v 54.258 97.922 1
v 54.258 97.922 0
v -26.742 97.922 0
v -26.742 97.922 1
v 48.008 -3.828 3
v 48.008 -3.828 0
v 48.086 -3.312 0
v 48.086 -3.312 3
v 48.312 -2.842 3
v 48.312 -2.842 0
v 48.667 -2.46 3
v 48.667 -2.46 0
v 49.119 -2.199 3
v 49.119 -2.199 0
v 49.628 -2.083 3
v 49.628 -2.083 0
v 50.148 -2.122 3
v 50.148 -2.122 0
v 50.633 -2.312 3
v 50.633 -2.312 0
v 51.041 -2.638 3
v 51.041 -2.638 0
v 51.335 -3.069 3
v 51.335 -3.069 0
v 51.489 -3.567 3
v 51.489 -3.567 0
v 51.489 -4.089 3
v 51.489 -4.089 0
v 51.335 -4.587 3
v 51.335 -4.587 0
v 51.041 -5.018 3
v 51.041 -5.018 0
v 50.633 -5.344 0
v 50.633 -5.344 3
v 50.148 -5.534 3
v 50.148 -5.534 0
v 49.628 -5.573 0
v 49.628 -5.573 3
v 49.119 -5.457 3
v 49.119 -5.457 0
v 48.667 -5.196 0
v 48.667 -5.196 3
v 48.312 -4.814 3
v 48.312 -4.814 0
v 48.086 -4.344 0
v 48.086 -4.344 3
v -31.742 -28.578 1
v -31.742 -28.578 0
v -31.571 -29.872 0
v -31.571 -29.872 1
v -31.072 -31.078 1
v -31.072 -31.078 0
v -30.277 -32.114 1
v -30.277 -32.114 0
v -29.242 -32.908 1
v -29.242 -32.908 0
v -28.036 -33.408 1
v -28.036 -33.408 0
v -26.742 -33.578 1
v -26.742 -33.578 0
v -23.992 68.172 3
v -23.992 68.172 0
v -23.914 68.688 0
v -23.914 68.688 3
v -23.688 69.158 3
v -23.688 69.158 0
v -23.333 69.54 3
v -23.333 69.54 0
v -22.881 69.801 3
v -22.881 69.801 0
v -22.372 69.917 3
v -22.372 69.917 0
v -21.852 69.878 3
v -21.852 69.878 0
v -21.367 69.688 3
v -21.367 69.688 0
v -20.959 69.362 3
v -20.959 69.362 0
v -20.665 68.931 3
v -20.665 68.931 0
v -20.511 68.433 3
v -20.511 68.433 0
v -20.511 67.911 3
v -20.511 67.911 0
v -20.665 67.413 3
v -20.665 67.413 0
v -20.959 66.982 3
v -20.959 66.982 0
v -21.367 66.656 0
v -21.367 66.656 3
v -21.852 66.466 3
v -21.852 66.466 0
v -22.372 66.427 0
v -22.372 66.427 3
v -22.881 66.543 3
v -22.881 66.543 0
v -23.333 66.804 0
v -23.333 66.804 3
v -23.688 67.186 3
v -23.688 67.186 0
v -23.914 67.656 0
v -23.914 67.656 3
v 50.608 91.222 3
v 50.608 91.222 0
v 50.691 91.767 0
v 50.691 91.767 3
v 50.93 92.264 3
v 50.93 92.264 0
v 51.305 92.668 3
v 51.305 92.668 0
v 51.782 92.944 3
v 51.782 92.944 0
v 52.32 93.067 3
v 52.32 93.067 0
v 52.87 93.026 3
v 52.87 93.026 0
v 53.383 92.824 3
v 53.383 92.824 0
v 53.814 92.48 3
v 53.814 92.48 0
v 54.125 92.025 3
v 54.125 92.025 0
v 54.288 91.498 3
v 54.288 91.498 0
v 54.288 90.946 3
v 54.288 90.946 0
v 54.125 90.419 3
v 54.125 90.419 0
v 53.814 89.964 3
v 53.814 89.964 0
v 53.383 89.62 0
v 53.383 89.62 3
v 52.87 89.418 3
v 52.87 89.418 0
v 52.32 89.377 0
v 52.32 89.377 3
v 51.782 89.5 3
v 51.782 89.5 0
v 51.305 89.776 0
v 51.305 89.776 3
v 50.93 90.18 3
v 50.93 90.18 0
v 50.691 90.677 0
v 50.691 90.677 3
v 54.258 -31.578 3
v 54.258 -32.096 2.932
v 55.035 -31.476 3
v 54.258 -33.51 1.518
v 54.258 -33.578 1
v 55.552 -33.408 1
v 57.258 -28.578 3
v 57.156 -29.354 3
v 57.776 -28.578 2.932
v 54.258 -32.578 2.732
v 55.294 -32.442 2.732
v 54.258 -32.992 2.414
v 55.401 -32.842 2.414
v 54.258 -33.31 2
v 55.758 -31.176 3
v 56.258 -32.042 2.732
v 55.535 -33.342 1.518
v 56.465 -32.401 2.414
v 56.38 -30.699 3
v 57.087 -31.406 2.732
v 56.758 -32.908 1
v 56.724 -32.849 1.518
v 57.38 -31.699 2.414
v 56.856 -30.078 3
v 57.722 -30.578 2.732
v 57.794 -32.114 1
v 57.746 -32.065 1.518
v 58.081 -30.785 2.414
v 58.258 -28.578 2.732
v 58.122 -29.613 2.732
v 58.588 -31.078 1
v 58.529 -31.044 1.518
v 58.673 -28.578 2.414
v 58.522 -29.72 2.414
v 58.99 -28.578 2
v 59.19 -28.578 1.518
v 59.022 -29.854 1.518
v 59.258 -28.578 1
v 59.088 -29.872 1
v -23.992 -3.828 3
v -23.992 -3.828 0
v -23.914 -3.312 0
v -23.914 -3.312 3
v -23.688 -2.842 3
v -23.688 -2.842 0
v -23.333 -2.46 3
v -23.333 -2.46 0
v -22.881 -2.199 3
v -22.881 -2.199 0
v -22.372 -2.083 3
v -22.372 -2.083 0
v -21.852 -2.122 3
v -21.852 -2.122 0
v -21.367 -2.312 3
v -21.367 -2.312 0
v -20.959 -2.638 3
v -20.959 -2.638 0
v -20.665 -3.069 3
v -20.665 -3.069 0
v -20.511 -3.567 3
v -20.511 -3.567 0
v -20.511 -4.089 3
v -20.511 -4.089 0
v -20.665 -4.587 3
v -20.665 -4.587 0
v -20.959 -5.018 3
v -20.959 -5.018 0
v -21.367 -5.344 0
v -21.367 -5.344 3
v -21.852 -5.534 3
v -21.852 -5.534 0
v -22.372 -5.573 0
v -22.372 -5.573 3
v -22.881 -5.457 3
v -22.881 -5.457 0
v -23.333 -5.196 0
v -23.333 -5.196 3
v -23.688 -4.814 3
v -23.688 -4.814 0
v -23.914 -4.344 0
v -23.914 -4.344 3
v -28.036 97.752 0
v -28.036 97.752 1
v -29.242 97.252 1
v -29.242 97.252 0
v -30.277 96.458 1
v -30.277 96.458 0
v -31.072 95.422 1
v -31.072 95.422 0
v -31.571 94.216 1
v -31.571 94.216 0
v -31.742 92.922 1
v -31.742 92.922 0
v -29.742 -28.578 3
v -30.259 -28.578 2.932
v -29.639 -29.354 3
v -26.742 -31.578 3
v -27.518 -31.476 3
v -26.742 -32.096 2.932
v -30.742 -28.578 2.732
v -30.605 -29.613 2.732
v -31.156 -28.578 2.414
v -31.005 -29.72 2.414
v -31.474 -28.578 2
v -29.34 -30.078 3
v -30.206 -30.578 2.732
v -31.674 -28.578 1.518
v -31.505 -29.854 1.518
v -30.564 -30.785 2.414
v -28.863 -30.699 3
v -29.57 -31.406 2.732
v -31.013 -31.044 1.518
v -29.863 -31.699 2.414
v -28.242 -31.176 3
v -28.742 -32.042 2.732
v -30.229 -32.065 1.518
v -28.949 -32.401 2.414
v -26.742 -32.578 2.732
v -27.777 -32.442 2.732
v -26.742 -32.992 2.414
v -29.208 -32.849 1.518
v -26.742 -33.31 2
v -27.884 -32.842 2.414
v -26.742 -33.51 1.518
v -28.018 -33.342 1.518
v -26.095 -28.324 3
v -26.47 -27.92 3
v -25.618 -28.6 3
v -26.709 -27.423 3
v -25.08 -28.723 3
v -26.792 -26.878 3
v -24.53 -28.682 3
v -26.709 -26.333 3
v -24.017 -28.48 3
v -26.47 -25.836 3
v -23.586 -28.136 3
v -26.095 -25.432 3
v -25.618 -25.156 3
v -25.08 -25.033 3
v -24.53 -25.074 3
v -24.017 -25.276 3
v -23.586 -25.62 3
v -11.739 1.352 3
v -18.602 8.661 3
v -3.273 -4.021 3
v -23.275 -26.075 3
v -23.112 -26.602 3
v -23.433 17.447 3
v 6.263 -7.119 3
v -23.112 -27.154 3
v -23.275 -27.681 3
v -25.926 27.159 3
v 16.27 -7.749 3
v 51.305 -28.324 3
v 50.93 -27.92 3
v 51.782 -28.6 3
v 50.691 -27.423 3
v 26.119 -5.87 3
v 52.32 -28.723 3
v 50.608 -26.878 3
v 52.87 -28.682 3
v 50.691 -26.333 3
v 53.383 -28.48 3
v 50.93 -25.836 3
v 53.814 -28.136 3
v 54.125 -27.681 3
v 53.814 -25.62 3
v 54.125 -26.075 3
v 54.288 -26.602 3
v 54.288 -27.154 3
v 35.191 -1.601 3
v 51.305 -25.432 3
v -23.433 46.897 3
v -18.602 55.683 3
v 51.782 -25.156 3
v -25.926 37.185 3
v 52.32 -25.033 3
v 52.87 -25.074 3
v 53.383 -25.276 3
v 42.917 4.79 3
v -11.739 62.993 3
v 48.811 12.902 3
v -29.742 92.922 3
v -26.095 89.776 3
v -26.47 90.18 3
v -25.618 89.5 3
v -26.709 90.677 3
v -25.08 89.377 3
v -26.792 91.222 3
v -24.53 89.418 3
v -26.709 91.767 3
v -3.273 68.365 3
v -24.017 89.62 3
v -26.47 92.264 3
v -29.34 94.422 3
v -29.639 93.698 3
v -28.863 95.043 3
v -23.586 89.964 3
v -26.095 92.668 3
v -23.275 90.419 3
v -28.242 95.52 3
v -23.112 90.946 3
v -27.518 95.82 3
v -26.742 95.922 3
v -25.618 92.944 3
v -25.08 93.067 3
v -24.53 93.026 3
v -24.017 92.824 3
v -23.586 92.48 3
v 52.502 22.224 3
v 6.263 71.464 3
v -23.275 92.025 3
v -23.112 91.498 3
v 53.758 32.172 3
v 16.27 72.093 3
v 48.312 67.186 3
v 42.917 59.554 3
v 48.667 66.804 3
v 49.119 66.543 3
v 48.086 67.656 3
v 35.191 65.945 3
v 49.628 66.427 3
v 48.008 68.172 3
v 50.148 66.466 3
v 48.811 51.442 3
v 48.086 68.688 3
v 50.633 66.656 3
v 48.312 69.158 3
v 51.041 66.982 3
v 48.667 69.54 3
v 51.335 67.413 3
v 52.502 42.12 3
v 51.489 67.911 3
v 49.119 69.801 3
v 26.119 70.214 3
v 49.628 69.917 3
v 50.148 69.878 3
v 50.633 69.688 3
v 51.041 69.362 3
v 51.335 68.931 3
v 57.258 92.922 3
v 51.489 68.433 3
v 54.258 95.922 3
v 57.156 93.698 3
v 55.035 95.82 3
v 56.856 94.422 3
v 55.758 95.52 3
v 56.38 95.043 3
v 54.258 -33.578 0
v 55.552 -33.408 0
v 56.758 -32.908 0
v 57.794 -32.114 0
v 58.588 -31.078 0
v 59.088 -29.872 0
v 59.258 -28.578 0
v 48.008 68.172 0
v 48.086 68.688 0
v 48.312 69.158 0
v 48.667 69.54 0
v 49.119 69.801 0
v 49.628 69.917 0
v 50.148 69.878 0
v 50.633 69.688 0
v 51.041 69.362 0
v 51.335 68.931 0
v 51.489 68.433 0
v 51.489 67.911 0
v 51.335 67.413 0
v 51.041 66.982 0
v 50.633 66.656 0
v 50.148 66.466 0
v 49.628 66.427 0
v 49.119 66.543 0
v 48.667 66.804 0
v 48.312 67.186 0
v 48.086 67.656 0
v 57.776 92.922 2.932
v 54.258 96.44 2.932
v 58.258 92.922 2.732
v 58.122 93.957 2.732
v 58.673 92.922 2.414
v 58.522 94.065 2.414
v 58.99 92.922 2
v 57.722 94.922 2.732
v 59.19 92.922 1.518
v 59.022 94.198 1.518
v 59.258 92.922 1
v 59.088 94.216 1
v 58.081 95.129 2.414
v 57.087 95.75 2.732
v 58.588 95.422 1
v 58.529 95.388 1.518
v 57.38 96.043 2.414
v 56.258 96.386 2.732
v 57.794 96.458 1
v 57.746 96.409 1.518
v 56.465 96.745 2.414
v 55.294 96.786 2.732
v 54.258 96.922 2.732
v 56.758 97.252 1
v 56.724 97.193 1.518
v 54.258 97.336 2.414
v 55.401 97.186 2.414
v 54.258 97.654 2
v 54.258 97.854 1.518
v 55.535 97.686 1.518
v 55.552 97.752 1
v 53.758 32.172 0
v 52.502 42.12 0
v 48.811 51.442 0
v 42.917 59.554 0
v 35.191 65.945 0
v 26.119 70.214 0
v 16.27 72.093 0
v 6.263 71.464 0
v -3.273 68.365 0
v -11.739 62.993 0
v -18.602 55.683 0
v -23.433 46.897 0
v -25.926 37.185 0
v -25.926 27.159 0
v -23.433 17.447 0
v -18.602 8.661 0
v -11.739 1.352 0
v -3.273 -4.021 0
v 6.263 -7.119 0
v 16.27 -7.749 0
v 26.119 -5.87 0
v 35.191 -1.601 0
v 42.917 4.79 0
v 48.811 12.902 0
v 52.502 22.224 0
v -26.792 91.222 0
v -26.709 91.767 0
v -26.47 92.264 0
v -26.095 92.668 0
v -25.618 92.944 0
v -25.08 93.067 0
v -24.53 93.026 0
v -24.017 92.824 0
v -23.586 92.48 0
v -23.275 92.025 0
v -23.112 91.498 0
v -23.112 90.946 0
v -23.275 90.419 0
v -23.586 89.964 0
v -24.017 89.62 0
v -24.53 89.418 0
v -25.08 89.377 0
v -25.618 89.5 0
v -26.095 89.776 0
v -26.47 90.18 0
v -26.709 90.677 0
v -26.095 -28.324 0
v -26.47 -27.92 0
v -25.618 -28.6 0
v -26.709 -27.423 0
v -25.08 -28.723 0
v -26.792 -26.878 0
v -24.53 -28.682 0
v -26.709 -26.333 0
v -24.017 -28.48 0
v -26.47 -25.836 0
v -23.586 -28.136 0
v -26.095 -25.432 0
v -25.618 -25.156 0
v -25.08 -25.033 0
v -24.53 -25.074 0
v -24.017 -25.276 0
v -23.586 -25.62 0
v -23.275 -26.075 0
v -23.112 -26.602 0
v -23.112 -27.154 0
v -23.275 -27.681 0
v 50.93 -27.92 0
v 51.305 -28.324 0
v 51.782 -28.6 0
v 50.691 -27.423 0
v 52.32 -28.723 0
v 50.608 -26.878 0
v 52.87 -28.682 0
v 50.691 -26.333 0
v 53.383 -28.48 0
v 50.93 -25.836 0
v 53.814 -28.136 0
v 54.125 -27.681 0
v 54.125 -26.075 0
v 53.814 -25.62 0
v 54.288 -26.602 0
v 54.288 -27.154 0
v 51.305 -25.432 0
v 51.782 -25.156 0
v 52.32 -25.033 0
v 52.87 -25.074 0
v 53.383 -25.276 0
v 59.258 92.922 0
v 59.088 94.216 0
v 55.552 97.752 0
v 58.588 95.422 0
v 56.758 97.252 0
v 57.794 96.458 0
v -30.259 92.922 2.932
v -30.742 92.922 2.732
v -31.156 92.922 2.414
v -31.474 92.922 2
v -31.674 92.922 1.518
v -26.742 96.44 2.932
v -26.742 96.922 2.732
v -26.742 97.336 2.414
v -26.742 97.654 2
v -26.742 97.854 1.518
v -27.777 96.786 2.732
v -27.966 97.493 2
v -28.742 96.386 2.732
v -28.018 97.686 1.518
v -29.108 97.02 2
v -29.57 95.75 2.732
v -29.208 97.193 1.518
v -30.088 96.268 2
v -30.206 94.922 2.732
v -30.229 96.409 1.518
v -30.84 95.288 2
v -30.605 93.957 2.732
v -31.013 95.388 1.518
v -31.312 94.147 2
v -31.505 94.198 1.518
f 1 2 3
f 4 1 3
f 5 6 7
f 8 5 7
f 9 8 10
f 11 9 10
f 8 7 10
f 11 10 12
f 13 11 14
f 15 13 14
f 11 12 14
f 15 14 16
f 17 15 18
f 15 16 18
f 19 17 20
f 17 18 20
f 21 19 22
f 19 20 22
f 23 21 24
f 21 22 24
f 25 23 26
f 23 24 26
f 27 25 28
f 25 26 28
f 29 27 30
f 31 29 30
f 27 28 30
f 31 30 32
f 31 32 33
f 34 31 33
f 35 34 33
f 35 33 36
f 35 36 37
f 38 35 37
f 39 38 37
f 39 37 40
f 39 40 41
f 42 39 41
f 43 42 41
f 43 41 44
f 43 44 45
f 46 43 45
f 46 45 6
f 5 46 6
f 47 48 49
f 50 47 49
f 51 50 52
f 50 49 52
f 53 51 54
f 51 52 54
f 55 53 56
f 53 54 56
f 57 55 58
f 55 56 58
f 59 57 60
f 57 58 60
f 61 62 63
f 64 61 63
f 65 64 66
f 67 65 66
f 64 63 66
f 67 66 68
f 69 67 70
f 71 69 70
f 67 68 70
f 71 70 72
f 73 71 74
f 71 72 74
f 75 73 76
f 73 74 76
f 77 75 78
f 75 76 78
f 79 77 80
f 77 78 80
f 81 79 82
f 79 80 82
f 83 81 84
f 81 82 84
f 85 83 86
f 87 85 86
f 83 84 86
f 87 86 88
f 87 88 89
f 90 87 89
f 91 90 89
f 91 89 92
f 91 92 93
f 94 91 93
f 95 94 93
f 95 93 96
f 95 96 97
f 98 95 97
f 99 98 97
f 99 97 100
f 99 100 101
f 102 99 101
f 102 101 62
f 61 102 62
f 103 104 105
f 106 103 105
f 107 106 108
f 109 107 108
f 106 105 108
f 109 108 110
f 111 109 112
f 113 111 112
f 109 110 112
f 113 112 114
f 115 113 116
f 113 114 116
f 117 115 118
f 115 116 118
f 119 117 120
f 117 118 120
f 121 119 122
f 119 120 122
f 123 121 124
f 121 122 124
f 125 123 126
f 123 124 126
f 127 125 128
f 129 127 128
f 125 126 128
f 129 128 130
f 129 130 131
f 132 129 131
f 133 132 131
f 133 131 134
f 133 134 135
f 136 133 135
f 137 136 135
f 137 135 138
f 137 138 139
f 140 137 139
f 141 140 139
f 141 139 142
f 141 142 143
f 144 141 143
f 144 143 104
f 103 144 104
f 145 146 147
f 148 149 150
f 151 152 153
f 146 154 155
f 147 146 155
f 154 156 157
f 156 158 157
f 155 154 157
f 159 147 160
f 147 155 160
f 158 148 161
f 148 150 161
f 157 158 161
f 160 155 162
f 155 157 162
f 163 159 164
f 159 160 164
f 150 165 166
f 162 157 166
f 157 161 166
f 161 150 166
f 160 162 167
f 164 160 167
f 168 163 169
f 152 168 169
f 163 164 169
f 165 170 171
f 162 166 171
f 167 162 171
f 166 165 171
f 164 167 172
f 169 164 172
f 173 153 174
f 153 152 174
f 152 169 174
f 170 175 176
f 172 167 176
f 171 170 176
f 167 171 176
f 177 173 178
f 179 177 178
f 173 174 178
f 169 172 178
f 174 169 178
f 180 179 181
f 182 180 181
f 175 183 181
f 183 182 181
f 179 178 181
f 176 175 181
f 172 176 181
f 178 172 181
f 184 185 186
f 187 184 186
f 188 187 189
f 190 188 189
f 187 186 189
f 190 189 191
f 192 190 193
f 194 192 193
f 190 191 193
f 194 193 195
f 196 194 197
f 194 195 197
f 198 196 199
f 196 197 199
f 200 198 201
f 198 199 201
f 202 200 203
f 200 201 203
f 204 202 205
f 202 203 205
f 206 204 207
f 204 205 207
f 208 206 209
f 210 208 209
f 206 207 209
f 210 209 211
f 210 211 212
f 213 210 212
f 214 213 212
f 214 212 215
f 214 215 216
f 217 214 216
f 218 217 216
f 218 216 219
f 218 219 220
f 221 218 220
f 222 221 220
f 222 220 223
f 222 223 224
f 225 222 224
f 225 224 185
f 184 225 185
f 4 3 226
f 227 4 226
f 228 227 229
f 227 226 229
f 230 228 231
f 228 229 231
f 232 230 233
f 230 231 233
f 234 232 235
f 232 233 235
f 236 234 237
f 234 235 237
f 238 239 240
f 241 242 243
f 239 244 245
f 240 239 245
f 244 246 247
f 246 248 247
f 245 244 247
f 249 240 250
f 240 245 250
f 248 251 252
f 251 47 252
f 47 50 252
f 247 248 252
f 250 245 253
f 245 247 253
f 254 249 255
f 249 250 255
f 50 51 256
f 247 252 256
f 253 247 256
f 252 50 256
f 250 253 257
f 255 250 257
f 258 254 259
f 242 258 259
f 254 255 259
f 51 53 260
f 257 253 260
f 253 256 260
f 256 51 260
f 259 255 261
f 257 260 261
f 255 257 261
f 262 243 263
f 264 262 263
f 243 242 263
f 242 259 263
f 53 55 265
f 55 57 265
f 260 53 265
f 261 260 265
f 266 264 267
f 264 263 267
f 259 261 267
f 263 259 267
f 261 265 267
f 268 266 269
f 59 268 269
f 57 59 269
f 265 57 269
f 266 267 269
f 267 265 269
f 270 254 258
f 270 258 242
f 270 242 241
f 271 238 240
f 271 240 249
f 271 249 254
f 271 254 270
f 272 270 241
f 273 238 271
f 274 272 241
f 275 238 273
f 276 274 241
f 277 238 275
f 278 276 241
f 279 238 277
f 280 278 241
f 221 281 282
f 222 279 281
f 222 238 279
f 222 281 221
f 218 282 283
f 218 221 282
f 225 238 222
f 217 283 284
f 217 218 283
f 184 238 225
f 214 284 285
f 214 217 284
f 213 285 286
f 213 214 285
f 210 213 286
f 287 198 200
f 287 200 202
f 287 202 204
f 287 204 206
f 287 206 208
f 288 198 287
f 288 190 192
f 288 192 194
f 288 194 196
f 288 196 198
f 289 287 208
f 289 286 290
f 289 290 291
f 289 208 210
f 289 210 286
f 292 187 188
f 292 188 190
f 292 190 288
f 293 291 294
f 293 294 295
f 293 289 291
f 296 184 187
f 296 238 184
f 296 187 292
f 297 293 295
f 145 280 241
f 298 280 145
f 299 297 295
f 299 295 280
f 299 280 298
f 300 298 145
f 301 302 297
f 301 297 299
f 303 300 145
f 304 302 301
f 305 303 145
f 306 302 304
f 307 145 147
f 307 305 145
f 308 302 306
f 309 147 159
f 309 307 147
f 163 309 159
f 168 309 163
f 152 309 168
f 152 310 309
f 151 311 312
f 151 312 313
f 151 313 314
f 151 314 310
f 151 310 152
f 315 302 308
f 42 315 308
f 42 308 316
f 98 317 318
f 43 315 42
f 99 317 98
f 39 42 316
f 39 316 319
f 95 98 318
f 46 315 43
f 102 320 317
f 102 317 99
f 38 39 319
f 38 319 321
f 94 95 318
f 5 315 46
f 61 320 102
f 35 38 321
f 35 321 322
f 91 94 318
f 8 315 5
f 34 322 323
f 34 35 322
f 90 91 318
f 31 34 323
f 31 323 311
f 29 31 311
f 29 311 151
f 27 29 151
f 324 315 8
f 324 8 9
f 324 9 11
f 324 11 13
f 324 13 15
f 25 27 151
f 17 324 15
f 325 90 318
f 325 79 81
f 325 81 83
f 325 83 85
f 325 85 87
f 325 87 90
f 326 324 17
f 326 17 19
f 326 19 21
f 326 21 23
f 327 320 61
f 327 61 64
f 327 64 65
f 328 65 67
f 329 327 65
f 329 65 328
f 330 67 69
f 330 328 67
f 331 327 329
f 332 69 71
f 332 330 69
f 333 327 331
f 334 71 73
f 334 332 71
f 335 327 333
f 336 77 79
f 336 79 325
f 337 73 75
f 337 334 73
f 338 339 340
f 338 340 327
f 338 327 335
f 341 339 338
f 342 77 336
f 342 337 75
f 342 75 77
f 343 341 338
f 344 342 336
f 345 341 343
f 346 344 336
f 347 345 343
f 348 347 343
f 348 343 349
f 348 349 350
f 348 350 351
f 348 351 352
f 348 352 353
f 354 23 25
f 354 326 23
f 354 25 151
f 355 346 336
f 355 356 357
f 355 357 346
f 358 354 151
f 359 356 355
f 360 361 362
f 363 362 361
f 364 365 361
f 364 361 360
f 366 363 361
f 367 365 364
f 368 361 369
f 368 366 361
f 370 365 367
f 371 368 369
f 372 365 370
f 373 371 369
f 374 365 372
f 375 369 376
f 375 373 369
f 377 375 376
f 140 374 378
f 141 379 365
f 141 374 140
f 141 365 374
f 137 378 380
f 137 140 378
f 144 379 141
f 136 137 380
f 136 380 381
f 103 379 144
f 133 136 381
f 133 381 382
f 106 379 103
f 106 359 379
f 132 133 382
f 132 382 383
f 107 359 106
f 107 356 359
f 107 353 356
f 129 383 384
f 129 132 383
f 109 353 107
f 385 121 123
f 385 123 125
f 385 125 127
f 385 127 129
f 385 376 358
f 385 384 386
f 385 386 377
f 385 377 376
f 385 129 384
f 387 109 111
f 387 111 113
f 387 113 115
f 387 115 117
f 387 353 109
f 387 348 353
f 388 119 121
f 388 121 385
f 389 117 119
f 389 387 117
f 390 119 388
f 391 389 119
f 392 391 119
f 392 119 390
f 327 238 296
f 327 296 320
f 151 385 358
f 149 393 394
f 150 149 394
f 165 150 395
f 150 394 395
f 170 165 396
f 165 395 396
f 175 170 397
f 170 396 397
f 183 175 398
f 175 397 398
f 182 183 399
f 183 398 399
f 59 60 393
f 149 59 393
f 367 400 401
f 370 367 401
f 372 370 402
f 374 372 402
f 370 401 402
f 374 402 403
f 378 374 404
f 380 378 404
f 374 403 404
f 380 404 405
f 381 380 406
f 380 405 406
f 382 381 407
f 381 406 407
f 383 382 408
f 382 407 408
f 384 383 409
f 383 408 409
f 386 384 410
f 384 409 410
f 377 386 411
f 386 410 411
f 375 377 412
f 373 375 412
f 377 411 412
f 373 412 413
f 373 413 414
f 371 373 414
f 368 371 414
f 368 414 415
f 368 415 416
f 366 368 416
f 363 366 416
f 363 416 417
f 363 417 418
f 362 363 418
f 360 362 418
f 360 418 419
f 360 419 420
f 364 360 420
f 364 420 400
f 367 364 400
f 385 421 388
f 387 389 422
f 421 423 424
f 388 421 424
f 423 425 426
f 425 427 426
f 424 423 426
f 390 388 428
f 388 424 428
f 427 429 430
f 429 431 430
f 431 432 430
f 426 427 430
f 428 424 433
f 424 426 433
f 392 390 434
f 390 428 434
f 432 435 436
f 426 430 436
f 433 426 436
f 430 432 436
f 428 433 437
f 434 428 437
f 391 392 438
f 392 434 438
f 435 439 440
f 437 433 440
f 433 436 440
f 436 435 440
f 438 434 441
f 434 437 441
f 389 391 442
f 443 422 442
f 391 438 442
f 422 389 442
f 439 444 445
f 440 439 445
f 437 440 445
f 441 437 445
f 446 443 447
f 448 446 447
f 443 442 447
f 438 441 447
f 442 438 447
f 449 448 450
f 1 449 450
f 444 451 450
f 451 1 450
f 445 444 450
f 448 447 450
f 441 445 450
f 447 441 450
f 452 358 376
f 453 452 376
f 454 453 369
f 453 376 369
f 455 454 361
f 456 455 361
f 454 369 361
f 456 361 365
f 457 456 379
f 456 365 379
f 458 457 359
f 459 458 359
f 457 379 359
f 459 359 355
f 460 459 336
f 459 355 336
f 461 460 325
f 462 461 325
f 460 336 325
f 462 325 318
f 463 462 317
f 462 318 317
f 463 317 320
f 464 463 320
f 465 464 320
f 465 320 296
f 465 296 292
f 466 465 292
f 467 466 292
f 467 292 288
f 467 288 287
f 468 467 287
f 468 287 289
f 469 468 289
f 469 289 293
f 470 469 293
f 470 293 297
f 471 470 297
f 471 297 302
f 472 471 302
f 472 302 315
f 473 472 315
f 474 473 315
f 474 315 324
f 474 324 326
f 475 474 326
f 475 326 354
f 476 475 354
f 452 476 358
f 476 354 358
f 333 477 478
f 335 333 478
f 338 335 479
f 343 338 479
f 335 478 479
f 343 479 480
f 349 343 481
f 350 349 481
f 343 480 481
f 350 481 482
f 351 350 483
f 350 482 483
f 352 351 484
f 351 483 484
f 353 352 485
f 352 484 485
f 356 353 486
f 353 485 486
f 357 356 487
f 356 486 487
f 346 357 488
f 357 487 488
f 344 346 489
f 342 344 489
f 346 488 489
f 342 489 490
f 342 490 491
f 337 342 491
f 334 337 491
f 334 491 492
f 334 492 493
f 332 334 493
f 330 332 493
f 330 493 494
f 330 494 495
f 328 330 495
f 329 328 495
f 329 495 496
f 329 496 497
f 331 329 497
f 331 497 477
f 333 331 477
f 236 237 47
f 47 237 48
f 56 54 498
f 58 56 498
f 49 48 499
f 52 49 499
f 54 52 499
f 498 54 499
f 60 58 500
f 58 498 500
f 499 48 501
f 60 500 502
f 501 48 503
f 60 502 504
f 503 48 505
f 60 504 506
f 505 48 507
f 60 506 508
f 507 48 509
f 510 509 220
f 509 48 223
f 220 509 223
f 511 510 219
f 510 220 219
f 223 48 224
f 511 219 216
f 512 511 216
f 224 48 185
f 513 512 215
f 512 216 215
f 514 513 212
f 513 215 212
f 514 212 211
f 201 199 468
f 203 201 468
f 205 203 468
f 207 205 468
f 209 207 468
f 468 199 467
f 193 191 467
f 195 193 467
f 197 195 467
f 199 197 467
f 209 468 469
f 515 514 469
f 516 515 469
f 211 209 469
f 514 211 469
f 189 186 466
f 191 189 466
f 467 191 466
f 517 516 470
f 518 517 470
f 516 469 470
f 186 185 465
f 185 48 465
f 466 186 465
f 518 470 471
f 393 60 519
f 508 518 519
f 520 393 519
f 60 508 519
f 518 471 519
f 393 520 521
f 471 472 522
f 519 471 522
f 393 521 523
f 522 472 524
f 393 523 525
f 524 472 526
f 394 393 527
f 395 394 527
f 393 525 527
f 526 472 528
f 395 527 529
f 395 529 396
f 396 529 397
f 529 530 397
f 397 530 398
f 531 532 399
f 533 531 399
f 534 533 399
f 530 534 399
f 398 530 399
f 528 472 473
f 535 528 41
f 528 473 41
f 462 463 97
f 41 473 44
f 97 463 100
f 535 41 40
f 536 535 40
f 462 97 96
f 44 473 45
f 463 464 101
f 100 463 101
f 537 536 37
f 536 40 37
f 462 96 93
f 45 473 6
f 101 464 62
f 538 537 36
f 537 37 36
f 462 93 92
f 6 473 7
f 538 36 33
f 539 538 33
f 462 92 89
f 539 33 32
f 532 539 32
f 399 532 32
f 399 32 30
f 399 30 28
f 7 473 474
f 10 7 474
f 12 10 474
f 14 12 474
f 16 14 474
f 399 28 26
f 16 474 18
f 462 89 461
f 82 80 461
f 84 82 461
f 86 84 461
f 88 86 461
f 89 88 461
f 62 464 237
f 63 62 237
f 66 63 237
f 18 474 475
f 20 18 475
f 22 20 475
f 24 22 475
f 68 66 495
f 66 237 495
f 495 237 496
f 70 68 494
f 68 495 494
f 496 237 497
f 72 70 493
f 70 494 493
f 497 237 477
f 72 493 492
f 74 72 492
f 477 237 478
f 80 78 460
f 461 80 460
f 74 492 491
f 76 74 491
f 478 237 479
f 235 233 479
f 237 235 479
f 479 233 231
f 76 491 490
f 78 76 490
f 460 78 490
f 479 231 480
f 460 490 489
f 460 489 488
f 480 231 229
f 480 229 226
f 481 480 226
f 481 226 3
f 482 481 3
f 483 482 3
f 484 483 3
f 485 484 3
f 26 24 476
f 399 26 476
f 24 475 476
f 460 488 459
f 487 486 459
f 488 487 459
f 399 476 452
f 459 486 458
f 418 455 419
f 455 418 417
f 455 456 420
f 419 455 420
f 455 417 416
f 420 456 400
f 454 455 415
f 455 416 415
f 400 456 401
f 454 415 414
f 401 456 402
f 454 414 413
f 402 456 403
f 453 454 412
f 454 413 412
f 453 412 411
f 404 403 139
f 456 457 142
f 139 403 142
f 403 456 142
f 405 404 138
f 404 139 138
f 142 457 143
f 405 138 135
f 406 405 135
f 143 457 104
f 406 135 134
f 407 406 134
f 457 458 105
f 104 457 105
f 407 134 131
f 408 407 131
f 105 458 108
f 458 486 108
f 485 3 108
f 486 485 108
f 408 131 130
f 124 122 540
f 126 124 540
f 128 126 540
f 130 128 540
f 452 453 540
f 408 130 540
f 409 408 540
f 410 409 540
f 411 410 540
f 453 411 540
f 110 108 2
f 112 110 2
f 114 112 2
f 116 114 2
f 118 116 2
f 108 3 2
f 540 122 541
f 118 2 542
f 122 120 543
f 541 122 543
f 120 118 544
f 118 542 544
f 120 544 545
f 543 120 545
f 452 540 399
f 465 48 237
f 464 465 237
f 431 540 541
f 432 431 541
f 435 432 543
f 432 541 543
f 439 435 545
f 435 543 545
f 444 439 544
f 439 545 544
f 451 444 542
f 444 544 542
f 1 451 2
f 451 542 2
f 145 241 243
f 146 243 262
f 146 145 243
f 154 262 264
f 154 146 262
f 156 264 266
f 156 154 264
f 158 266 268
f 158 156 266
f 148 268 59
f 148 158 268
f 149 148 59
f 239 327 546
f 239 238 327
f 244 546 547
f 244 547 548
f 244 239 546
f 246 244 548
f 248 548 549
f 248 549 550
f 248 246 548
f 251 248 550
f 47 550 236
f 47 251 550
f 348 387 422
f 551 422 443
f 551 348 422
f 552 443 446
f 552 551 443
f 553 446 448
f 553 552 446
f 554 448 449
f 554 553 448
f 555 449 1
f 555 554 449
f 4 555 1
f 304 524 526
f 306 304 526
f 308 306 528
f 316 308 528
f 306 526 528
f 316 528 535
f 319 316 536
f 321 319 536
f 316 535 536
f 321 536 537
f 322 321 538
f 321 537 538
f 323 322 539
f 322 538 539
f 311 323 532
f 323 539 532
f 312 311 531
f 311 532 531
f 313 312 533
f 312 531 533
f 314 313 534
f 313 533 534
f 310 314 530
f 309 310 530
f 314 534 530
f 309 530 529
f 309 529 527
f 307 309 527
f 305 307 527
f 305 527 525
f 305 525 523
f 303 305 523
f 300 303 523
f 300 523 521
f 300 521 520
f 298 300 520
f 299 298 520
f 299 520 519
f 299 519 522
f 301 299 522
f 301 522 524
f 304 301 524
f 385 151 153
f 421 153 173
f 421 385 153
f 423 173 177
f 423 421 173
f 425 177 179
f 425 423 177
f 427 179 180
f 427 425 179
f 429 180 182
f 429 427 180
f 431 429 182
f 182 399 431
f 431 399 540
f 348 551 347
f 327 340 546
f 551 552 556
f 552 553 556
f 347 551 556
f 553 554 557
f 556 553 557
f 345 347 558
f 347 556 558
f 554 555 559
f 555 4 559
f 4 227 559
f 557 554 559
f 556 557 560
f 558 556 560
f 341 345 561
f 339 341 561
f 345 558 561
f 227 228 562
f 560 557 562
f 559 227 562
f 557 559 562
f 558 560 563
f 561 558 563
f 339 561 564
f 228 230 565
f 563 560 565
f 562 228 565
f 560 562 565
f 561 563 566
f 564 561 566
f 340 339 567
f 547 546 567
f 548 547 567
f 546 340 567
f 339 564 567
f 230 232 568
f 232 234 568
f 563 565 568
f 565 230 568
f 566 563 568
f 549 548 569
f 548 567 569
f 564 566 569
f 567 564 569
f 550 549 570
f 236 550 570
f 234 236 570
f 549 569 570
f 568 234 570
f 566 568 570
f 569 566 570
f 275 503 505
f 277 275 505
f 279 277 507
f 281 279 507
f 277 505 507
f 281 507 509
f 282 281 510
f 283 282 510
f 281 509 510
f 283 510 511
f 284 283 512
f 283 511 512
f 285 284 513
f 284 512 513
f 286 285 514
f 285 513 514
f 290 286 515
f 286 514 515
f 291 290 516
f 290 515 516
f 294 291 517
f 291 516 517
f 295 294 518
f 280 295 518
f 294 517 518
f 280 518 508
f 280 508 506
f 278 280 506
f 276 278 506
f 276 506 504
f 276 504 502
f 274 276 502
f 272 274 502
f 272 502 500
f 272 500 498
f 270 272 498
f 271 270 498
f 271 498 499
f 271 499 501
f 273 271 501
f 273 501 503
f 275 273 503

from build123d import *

# Parameters (mm, degrees)
F1_DEPTH = 3
F3_D     = 3.7
F5_R     = 40
F6_DEPTH = 25
F7_R     = 2
F8_D     = 3.5


with BuildPart() as f1:
    # F0 (on Top) → F1 (new body)
    with BuildSketch(Plane.XY):
        with BuildLine():
            Line((-26.741671, -33.577967), (54.258329, -33.577967))
            ThreePointArc((54.258329, -33.577967), (57.793863, -32.113501), (59.258329, -28.577967))
            Line((59.258329, -28.577967), (59.258329, 92.922033))
            ThreePointArc((59.258329, 92.922033), (57.793863, 96.457566), (54.258329, 97.922033))
            Line((54.258329, 97.922033), (-26.741671, 97.922033))
            ThreePointArc((-26.741671, 97.922033), (-30.277205, 96.457566), (-31.741671, 92.922033))
            Line((-31.741671, 92.922033), (-31.741671, -28.577967))
            ThreePointArc((-31.741671, -28.577967), (-30.277205, -32.113501), (-26.741671, -33.577967))
        make_face()
    extrude(amount=F1_DEPTH)

    # F3 (through all)
    with Locations(Plane.XY.offset(3)):
        with Locations((-24.941671, 91.222033), (52.458329, 91.222033), (52.458329, -26.877967), (-24.941671, -26.877967)):
            Hole(F3_D / 2)

    # F5 (on face) → F6 (cut)
    with BuildSketch(Plane.XY.offset(3)):
        with Locations((13.758329, 32.172033)):
            Circle(F5_R)
    extrude(amount=-F6_DEPTH, mode=Mode.SUBTRACT)

    # F7
    f7_edges = [f1.edges().sort_by_distance(p)[0] for p in [
        (-31.741671, 32.172033, 3),
        (13.758329, 97.922033, 3),
    ]]
    fillet(f7_edges, radius=F7_R)

    # F8 (through all)
    with Locations(Plane.XY.offset(3)):
        with Locations((-22.241671, 68.172033), (49.758329, 68.172033), (49.758329, -3.827967), (-22.241671, -3.827967)):
            Hole(F8_D / 2)


solid = f1.part
